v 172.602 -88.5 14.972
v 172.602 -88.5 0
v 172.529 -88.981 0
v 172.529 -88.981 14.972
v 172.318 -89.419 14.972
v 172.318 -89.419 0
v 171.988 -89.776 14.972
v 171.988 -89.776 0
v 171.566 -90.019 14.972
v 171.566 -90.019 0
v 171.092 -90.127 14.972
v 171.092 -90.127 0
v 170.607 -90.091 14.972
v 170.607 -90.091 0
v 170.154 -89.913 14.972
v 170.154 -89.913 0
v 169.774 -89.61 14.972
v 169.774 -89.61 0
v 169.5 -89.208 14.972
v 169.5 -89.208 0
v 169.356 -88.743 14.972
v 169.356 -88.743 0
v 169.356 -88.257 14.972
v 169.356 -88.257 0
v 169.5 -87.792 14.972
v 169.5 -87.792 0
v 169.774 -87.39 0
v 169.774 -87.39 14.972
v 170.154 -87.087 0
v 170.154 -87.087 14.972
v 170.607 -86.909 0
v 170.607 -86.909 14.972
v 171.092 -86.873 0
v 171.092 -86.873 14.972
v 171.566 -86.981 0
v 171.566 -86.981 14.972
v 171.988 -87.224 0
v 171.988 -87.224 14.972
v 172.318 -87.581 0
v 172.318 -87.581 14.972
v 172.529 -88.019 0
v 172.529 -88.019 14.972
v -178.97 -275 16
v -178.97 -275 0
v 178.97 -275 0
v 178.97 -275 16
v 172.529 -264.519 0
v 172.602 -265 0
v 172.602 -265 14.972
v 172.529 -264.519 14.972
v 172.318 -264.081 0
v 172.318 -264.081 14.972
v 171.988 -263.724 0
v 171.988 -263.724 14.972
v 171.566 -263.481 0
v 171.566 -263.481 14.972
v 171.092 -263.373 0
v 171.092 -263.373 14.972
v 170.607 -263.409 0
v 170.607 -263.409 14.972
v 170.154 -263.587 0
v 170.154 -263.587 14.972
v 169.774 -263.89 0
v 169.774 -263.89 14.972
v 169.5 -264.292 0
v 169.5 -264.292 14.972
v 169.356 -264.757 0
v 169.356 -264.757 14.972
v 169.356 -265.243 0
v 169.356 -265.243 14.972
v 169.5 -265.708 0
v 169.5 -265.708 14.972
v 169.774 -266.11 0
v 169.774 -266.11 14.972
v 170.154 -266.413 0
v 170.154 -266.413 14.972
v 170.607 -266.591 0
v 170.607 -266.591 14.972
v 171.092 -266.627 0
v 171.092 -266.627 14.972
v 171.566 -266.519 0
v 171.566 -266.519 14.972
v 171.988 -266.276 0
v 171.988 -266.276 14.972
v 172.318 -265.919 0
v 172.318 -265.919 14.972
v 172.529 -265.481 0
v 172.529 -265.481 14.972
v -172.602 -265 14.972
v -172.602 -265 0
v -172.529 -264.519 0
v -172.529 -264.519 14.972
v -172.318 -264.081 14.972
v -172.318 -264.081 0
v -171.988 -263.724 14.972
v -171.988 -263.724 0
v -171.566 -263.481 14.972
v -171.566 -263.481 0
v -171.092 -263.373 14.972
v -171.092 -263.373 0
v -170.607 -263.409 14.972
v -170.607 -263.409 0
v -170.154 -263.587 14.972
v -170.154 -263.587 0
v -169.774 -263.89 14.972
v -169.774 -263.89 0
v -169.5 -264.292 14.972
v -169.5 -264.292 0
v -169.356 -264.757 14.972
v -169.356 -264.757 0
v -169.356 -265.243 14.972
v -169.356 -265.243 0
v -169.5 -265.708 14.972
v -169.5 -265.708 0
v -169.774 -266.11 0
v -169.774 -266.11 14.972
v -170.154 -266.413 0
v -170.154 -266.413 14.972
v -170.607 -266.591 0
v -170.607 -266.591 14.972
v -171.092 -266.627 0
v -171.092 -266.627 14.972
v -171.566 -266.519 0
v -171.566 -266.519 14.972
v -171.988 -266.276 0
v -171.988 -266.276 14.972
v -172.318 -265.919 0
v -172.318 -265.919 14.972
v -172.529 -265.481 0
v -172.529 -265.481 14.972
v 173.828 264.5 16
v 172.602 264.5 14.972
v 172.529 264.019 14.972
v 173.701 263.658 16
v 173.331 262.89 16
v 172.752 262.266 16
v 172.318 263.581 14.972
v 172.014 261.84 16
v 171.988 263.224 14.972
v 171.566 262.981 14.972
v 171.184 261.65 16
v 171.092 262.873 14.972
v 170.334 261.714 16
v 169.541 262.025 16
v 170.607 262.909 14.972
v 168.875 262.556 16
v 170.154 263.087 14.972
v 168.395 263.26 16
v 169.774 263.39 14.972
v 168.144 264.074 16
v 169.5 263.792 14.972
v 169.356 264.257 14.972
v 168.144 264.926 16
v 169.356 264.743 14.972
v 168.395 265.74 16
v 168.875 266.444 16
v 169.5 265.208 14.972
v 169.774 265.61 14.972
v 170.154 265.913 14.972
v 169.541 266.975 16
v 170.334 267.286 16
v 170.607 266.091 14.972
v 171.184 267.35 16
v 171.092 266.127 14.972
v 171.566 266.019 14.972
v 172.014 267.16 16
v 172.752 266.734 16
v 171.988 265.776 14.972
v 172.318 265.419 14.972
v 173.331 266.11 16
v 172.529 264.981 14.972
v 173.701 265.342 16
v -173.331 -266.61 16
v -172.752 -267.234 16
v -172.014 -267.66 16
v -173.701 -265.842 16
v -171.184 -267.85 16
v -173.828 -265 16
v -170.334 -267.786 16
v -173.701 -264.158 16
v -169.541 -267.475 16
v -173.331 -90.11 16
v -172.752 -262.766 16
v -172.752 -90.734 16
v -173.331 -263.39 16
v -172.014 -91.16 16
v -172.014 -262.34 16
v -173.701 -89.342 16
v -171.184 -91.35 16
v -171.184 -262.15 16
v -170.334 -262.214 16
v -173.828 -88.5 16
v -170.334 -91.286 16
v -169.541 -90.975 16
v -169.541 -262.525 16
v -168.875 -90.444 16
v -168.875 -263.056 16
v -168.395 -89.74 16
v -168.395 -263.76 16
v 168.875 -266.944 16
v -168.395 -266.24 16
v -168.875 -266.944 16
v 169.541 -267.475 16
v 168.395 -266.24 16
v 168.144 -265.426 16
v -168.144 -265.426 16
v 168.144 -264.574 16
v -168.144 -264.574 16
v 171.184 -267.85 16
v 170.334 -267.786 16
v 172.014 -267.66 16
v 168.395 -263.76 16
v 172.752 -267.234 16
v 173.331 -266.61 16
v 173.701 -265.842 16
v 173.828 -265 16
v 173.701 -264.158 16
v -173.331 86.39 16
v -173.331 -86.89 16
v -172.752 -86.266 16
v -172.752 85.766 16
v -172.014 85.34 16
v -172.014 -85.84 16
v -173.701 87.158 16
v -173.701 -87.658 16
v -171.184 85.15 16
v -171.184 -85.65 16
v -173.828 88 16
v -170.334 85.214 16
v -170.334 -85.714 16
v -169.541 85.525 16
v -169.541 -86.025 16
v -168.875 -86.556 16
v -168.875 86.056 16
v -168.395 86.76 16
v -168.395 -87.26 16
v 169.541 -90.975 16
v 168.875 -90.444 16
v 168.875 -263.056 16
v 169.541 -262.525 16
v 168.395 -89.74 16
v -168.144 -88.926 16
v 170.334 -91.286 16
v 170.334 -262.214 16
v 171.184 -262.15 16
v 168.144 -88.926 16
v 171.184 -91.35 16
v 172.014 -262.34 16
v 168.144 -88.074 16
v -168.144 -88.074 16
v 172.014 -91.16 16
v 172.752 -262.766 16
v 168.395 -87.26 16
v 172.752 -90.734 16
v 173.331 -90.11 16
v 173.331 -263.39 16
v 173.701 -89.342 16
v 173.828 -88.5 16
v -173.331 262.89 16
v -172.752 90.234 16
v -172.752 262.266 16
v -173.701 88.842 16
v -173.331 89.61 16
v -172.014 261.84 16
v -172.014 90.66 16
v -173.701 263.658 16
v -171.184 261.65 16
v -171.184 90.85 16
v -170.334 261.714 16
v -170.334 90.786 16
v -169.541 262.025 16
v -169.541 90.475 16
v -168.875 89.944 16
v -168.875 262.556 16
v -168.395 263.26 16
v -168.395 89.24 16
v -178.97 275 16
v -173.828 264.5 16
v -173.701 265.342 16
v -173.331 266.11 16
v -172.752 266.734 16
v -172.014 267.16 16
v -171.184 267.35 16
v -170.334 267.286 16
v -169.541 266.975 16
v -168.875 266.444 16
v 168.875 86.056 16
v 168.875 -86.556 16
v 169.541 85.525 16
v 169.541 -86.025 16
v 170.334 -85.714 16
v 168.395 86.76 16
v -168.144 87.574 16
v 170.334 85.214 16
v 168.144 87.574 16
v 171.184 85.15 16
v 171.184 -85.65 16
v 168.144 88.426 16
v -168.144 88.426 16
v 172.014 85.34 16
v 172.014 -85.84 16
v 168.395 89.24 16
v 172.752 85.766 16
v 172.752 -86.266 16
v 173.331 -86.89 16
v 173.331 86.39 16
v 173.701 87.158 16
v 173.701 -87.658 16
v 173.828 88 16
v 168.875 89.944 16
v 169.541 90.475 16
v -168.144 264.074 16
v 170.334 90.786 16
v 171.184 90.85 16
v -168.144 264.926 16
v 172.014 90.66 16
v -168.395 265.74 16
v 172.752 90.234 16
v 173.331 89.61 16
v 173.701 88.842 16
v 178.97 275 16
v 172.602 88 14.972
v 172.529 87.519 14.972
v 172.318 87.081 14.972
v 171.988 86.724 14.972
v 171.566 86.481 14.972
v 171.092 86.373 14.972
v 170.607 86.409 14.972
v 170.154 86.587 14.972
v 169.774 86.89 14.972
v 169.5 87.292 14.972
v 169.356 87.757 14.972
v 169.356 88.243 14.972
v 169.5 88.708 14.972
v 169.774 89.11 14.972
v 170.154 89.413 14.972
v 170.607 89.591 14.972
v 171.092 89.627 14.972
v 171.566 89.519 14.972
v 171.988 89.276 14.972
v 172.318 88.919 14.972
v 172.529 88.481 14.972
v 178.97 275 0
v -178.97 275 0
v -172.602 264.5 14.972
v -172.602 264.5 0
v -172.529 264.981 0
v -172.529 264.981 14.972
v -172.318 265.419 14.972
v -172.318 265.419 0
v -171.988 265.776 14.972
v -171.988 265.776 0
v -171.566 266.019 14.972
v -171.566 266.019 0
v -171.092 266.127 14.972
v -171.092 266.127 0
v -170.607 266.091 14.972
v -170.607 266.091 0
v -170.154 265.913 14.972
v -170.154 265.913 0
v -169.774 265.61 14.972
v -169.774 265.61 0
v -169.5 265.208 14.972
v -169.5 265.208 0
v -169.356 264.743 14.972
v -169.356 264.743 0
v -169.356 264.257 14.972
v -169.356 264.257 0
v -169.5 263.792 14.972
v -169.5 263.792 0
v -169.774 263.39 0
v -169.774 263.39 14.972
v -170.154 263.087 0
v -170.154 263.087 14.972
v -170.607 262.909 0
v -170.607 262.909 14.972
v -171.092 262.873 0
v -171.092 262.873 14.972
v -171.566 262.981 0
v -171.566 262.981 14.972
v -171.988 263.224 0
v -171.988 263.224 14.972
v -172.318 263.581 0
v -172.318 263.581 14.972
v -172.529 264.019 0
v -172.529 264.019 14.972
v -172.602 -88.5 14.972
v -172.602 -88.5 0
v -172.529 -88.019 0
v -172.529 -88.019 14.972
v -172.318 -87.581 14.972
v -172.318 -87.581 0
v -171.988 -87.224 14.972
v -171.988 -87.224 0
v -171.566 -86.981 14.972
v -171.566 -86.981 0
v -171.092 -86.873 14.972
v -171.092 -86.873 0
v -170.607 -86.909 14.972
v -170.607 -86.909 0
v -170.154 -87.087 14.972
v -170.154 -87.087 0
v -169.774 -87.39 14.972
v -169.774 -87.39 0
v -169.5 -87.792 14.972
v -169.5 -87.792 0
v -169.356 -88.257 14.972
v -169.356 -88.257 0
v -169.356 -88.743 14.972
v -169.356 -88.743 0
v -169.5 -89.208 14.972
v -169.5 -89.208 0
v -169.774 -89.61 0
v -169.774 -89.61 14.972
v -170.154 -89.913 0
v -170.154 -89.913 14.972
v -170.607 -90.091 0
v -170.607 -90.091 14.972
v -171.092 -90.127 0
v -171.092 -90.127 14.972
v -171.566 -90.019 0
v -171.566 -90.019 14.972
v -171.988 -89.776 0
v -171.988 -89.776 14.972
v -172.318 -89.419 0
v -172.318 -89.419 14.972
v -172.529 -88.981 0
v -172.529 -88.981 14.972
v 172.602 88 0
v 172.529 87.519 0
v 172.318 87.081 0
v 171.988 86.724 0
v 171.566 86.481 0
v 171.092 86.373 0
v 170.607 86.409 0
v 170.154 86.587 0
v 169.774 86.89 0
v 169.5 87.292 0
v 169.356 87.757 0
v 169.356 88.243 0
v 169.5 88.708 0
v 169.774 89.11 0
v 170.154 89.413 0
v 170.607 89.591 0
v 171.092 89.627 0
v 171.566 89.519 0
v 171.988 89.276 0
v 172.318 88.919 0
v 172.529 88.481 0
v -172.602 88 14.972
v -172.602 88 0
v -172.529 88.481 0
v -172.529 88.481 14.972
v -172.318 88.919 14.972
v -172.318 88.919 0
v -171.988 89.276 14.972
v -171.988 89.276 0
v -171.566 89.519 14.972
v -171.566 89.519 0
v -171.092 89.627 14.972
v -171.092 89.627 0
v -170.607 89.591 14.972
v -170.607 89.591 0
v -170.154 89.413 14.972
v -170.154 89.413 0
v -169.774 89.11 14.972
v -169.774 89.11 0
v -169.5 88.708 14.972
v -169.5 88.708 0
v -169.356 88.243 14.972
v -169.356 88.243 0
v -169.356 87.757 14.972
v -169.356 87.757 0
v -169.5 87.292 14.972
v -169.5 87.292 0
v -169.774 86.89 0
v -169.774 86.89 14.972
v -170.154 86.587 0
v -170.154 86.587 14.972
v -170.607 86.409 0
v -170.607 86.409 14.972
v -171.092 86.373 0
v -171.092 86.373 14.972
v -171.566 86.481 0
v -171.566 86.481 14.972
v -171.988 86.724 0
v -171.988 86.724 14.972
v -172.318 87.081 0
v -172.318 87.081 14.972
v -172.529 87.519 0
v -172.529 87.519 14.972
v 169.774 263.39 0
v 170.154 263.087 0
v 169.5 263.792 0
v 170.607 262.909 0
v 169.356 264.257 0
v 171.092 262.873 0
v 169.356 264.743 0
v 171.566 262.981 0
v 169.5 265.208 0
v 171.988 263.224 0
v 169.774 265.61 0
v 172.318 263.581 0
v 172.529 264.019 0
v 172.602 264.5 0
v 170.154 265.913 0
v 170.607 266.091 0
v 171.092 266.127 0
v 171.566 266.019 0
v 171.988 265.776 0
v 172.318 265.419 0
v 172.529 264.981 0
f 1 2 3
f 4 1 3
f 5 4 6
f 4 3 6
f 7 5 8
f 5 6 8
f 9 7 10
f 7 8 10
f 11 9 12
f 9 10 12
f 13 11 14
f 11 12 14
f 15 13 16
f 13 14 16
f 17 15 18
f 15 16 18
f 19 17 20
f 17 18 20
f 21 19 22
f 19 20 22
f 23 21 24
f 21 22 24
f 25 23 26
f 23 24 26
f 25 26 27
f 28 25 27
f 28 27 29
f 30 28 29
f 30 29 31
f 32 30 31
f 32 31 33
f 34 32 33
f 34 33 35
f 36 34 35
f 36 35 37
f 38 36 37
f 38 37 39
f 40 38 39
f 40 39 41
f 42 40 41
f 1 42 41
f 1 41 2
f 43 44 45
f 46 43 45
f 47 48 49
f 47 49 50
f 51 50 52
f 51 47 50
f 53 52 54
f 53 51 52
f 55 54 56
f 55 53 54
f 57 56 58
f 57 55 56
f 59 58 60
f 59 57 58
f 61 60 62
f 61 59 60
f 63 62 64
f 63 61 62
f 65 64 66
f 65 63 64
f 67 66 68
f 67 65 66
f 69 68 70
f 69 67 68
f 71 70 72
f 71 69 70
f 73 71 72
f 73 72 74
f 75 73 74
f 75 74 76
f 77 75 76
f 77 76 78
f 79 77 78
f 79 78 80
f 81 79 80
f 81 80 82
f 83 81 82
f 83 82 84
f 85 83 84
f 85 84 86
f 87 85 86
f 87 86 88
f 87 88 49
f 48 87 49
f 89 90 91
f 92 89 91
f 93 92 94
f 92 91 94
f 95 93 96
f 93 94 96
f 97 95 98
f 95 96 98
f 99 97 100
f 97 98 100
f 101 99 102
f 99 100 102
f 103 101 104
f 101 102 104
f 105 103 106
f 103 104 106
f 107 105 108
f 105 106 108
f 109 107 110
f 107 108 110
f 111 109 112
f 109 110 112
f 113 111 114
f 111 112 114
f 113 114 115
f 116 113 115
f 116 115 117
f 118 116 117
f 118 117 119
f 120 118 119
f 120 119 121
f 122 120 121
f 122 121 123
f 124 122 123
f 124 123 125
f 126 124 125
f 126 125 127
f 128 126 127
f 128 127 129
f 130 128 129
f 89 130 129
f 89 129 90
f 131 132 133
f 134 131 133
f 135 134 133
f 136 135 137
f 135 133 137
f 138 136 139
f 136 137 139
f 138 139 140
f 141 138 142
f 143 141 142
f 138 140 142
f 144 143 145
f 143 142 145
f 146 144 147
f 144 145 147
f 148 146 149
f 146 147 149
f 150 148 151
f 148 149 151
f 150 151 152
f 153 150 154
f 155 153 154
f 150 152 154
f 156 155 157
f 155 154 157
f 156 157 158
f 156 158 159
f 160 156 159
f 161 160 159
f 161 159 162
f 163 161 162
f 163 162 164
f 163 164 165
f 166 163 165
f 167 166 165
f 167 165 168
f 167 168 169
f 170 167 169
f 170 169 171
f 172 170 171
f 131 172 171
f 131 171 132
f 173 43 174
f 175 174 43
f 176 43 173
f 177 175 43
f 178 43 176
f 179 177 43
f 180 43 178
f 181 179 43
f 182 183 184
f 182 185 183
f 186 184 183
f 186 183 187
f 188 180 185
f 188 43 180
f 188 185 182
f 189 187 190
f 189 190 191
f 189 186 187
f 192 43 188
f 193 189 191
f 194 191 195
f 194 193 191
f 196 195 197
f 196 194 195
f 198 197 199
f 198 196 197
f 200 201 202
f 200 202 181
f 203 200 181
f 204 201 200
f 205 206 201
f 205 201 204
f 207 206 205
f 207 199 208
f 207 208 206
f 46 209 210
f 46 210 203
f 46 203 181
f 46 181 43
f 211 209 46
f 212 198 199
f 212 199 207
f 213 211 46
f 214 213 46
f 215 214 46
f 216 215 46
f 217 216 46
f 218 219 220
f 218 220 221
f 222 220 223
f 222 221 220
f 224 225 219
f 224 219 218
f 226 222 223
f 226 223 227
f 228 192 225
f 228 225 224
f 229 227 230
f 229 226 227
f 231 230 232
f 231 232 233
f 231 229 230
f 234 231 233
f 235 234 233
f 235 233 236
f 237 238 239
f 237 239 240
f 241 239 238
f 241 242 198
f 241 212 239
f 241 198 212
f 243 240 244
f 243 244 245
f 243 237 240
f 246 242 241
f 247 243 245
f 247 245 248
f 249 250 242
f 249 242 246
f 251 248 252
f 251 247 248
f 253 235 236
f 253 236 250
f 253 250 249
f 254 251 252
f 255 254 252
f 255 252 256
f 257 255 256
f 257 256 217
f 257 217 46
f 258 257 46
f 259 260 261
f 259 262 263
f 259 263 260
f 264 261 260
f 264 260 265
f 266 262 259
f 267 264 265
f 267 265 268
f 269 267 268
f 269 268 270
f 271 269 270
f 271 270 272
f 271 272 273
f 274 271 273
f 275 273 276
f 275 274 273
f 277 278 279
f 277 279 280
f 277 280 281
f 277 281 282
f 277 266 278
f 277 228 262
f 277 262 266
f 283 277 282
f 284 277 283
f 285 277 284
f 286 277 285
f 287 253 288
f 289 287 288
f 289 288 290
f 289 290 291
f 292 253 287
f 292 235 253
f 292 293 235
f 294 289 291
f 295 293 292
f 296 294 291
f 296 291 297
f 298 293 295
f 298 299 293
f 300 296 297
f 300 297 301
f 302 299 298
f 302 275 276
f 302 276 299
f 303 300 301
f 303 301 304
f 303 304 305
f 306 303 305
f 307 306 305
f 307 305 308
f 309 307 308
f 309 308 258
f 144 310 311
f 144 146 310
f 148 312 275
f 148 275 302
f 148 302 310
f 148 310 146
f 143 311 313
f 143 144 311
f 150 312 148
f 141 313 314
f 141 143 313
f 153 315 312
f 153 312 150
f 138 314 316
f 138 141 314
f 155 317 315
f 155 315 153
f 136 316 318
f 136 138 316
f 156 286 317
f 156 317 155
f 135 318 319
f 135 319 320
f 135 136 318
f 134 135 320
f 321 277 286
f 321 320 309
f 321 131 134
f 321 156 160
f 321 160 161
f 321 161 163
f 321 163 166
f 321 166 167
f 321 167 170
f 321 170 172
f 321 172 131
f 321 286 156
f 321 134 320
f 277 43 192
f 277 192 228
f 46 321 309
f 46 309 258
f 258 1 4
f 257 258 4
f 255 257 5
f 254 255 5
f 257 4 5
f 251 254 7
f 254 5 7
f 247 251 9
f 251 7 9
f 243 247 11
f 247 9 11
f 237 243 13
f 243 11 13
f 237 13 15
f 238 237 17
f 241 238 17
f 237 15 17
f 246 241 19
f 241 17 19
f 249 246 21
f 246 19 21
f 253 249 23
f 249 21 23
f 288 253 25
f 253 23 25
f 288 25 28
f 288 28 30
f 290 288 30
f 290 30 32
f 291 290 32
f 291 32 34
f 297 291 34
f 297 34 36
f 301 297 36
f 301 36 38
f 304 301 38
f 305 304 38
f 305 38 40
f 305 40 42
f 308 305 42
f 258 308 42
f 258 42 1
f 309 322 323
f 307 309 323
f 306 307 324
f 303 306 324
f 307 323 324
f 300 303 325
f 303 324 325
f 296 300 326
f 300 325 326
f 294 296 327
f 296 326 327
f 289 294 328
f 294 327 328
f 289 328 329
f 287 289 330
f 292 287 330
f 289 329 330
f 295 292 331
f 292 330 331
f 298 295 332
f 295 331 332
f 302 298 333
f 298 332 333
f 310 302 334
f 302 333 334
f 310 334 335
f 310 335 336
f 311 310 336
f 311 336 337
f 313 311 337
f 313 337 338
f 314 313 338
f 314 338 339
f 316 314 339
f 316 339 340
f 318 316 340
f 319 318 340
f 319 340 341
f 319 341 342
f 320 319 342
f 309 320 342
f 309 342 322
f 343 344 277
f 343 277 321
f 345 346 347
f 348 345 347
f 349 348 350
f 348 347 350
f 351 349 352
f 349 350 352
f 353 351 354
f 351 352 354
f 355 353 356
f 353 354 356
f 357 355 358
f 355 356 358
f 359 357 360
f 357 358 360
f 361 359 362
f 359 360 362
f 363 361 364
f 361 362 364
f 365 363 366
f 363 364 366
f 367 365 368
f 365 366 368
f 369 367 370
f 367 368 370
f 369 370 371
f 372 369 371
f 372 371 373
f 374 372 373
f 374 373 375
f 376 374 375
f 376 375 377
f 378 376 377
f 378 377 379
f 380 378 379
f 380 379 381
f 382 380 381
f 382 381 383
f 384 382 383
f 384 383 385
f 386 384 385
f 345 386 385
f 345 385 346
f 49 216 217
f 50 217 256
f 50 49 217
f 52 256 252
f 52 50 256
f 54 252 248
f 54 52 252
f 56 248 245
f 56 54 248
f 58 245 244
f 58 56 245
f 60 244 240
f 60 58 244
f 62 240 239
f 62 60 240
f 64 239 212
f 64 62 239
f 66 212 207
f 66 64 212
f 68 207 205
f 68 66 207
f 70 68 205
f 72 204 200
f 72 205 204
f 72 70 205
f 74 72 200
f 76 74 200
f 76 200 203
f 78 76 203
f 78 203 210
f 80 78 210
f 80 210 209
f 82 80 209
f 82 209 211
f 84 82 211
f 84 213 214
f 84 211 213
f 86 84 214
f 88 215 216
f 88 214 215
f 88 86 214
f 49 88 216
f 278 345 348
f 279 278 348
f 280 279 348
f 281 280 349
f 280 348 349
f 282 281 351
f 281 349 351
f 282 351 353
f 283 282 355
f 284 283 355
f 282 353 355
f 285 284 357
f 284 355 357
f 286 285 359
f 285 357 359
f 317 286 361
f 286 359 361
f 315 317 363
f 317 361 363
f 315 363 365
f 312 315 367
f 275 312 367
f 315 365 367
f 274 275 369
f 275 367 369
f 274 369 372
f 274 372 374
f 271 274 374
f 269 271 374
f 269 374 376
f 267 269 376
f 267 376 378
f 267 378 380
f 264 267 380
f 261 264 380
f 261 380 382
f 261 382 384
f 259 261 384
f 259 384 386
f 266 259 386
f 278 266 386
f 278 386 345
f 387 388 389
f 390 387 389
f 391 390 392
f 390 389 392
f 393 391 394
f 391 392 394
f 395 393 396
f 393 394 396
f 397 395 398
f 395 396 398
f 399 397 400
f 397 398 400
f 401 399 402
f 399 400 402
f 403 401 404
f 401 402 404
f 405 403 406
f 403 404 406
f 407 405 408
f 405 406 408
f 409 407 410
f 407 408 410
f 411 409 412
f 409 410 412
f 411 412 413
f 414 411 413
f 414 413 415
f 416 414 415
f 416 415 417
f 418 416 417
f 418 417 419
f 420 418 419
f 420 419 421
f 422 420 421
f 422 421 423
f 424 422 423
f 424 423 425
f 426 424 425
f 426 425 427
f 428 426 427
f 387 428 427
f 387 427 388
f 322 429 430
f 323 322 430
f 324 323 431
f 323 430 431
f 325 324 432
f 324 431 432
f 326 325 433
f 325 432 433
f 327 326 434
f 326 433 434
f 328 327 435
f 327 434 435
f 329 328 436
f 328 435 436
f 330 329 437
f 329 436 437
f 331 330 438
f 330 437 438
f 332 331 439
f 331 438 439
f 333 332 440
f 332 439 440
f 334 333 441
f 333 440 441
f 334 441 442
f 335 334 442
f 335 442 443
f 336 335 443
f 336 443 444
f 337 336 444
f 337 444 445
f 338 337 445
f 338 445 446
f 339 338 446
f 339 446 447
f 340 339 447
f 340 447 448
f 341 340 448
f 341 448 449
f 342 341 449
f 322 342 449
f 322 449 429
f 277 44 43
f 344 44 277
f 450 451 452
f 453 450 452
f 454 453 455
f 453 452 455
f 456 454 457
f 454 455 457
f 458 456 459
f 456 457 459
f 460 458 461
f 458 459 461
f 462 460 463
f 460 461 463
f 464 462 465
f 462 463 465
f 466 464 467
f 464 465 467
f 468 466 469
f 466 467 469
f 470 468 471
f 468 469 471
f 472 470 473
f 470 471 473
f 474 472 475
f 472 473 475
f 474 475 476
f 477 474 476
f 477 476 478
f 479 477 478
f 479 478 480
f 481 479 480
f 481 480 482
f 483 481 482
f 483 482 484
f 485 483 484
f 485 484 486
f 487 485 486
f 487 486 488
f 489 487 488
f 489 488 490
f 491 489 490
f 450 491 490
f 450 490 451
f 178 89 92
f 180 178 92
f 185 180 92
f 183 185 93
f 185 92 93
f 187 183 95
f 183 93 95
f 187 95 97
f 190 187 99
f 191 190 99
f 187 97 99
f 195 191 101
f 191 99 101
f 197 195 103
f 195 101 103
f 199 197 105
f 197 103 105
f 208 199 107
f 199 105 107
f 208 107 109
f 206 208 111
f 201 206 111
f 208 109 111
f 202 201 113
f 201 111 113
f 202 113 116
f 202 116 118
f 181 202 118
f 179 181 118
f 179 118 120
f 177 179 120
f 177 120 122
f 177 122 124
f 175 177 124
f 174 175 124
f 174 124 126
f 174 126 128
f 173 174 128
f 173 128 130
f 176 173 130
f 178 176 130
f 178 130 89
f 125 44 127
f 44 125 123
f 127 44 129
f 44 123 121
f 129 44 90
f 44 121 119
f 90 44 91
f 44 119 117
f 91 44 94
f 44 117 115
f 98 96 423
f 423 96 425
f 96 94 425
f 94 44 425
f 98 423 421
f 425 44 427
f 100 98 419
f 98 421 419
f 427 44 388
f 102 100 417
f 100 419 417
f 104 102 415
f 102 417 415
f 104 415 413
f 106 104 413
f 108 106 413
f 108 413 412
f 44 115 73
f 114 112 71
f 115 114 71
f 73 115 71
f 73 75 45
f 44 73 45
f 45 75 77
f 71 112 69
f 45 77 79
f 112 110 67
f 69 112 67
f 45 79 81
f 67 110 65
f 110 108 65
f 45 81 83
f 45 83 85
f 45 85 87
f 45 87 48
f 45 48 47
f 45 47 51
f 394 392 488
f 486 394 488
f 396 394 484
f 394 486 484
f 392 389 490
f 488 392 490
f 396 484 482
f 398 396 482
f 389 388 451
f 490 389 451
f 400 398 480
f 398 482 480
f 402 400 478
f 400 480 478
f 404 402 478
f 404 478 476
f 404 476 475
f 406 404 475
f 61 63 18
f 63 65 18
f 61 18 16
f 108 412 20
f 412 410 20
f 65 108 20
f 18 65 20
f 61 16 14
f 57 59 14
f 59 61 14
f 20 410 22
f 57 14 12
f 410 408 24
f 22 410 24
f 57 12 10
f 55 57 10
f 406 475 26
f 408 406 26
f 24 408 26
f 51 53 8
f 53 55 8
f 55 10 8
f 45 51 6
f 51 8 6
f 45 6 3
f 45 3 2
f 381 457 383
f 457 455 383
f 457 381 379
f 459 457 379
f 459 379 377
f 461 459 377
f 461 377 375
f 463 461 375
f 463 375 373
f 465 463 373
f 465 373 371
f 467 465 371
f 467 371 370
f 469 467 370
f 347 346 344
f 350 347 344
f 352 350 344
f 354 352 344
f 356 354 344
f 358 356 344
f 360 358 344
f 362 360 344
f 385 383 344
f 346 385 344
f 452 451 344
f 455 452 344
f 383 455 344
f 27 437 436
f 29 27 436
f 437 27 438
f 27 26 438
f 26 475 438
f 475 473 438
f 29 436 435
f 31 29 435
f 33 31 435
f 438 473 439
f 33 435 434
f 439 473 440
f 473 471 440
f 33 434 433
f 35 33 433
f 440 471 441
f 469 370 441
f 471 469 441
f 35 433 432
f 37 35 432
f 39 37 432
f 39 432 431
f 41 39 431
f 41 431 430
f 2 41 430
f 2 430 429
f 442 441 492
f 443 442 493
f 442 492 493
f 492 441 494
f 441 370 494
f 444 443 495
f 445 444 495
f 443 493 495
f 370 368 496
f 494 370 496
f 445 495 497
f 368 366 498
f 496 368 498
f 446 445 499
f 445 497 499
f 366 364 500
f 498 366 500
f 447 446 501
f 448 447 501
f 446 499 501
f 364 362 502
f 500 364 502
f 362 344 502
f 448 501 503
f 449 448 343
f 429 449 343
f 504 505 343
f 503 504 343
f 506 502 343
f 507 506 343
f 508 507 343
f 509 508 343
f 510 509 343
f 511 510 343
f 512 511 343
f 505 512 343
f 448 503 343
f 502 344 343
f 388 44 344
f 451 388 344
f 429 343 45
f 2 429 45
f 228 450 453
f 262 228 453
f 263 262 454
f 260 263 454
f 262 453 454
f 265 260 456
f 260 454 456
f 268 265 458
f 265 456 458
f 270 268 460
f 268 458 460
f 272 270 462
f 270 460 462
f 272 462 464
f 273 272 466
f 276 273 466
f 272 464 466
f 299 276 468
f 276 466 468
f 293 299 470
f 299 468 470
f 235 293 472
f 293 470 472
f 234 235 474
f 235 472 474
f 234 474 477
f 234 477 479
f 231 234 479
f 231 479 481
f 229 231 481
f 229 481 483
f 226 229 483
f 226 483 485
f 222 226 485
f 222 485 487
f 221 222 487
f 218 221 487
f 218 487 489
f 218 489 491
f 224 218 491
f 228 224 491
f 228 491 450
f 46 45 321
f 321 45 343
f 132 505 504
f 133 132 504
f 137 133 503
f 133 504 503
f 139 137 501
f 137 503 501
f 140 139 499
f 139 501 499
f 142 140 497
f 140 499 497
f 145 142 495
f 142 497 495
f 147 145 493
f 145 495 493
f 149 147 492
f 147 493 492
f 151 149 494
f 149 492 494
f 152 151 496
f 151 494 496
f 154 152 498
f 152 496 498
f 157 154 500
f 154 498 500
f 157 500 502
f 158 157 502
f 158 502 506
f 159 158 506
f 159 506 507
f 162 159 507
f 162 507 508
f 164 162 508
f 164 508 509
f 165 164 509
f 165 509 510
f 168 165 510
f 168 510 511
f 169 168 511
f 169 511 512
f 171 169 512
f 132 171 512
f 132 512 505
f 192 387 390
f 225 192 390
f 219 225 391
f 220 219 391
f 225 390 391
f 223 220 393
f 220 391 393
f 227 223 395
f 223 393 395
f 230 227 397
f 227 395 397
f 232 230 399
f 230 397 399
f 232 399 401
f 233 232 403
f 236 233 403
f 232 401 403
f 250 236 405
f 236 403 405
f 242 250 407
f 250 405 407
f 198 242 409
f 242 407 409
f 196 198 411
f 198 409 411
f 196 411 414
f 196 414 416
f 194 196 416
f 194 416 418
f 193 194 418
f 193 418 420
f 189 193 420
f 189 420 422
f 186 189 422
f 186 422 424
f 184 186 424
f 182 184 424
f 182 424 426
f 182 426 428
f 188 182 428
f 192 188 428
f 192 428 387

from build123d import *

# Parameters (mm, degrees)
SKETCH1_W                                         = 357.94
SKETCH1_H                                         = 550
BOSS_EXTRUDE1_DEPTH                               = 16
CSK_FOR_4_FLAT_HEAD_MACHINE_SCREW_100_D           = 3.2639
CSK_FOR_4_FLAT_HEAD_MACHINE_SCREW_100_DEPTH       = 16
CSK_FOR_4_FLAT_HEAD_MACHINE_SCREW_100_CSINK_D     = 5.715
CSK_FOR_4_FLAT_HEAD_MACHINE_SCREW_100_CSINK_ANGLE = 100
LPATTERN1_COUNT                                   = 4
LPATTERN1_PITCH                                   = 176.5
MIRROR1_COPY_1_D                                  = 3.2639
MIRROR1_COPY_1_DEPTH                              = 16
MIRROR1_COPY_1_CSINK_D                            = 5.715
MIRROR1_COPY_1_CSINK_ANGLE                        = 100
MIRROR1_COPY_2_D                                  = 3.2639
MIRROR1_COPY_2_DEPTH                              = 16
MIRROR1_COPY_2_CSINK_D                            = 5.715
MIRROR1_COPY_2_CSINK_ANGLE                        = 100
MIRROR1_COPY_3_D                                  = 3.2639
MIRROR1_COPY_3_DEPTH                              = 16
MIRROR1_COPY_3_CSINK_D                            = 5.715
MIRROR1_COPY_3_CSINK_ANGLE                        = 100


with BuildPart() as part:
    # Sketch1 → Boss-Extrude1 (new body)
    with BuildSketch(Plane.XY):
        Rectangle(SKETCH1_W, SKETCH1_H)
    extrude(amount=BOSS_EXTRUDE1_DEPTH)

    # CSK for #4 Flat Head Machine Screw (100)1
    with Locations(Plane(origin=(-170.97, -265, 16), x_dir=(1, 0, 0), z_dir=(0, 0, 1))):
        with Locations((0, 0)):
            csk_for_4_flat_head_machine_screw_100 = CounterSinkHole(CSK_FOR_4_FLAT_HEAD_MACHINE_SCREW_100_D / 2, CSK_FOR_4_FLAT_HEAD_MACHINE_SCREW_100_CSINK_D / 2, depth=CSK_FOR_4_FLAT_HEAD_MACHINE_SCREW_100_DEPTH, counter_sink_angle=CSK_FOR_4_FLAT_HEAD_MACHINE_SCREW_100_CSINK_ANGLE)

    # LPattern1: CSK for #4 Flat Head Machine Screw (100)1 ×4
    with Locations(*[(0, i * LPATTERN1_PITCH, 0) for i in range(1, LPATTERN1_COUNT)]):
        add(csk_for_4_flat_head_machine_screw_100, mode=Mode.SUBTRACT)

    # Mirror1: CSK for #4 Flat Head Machine Screw (100)1 across plane
    add(csk_for_4_flat_head_machine_screw_100.mirror(Plane(origin=(0, 0, 0), x_dir=(0, 0, 1), z_dir=(1, 0, 0))), mode=Mode.SUBTRACT)

    # Mirror1 copy 1
    with Locations(Plane(origin=(170.97, -88.5, 16), x_dir=(-1, 0, 0), z_dir=(0, 0, 1))):
        with Locations((0, 0)):
            CounterSinkHole(MIRROR1_COPY_1_D / 2, MIRROR1_COPY_1_CSINK_D / 2, depth=MIRROR1_COPY_1_DEPTH, counter_sink_angle=MIRROR1_COPY_1_CSINK_ANGLE)

    # Mirror1 copy 2
    with Locations(Plane(origin=(170.97, 88, 16), x_dir=(-1, 0, 0), z_dir=(0, 0, 1))):
        with Locations((0, 0)):
            CounterSinkHole(MIRROR1_COPY_2_D / 2, MIRROR1_COPY_2_CSINK_D / 2, depth=MIRROR1_COPY_2_DEPTH, counter_sink_angle=MIRROR1_COPY_2_CSINK_ANGLE)

    # Mirror1 copy 3
    with Locations(Plane(origin=(170.97, 264.5, 16), x_dir=(-1, 0, 0), z_dir=(0, 0, 1))):
        with Locations((0, 0)):
            CounterSinkHole(MIRROR1_COPY_3_D / 2, MIRROR1_COPY_3_CSINK_D / 2, depth=MIRROR1_COPY_3_DEPTH, counter_sink_angle=MIRROR1_COPY_3_CSINK_ANGLE)


solid = part.part
